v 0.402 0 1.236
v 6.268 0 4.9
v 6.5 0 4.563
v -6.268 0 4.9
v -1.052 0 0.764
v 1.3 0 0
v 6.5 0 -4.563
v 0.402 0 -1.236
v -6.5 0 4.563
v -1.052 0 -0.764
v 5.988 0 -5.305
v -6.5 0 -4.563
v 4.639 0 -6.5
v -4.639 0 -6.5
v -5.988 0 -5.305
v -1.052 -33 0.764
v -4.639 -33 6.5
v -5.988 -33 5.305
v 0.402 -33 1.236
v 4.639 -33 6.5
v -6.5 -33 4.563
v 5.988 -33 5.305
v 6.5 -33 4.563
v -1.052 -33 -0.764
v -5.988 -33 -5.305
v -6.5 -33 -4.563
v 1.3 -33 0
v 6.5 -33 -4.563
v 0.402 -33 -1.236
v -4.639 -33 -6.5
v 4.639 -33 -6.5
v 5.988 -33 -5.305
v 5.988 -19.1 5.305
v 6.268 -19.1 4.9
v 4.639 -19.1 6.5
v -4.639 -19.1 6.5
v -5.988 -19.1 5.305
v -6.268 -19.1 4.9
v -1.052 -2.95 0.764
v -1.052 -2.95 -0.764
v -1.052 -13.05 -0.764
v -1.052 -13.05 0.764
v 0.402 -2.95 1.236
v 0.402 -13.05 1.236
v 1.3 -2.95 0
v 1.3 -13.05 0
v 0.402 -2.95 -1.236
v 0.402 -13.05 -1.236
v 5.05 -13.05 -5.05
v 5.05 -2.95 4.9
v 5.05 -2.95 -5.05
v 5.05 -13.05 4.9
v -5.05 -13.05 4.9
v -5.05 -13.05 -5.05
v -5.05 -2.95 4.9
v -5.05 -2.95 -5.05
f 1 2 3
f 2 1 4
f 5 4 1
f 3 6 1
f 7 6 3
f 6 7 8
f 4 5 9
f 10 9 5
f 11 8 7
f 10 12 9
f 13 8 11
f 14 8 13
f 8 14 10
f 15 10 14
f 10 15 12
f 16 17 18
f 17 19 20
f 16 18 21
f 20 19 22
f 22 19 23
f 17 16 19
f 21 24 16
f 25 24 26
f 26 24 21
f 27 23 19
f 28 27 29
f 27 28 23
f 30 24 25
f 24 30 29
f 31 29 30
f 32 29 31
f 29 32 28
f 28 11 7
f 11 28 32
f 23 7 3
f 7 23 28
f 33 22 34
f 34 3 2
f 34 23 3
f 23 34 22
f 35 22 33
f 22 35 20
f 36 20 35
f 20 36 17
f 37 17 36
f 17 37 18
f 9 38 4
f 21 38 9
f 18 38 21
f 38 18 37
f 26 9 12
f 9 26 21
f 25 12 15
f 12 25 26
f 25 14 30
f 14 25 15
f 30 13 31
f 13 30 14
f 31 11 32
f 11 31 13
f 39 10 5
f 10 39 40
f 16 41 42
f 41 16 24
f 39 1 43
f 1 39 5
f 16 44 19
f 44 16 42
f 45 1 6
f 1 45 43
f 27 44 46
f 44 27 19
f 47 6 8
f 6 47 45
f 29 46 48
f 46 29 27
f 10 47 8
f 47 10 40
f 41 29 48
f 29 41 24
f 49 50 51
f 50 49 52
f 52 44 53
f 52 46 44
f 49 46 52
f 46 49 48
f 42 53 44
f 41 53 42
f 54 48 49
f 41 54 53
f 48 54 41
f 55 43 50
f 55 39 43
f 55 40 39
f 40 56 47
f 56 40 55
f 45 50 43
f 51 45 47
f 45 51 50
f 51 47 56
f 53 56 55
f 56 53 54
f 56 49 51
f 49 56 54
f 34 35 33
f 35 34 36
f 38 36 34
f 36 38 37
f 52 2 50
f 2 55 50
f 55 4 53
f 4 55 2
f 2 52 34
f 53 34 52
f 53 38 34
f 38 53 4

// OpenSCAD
//
//  Copyright (C) 09-06-2013 Jasper den Ouden.
//
//  This is free software: you can redistribute it and/or modify
//  it under the terms of the GNU General Public License as published
//  by the Free Software Foundation, either version 3 of the License, or
//  (at your option) any later version.
//

//Thing to fix the prusa mendel bed. Make sure the head doesnt hit it sideways!
// I suggest you move the endstops to help.
// (And make sure the firmware limitations arent too wide)
//The z-rods have spring in them that might help with collisions a lot too.

sr=1.3;

t=3;
d=20;
w=10;
et=0.1;
st = 6;

module bed_fixer(through=false)
{
    difference()
    {   linear_extrude(height=t + w + d) intersection()
        {   difference(){ circle(w/2+t); circle(sr); }
            square([w+t,w+t], center=true);
        }
        translate([0,0,t+w/2]) cube((w+et)*[1,through ? 8 : 1,1], center=true);
        translate([0,w/2-et+2*d,t+w+st+et-2*d]) cube(4*[d,d,d],center=true);
    }
    
}

module bed_fixer_through() //TODO strengthen it??
{    bed_fixer(through=true); }

rotate([90,0,0]) bed_fixer();
